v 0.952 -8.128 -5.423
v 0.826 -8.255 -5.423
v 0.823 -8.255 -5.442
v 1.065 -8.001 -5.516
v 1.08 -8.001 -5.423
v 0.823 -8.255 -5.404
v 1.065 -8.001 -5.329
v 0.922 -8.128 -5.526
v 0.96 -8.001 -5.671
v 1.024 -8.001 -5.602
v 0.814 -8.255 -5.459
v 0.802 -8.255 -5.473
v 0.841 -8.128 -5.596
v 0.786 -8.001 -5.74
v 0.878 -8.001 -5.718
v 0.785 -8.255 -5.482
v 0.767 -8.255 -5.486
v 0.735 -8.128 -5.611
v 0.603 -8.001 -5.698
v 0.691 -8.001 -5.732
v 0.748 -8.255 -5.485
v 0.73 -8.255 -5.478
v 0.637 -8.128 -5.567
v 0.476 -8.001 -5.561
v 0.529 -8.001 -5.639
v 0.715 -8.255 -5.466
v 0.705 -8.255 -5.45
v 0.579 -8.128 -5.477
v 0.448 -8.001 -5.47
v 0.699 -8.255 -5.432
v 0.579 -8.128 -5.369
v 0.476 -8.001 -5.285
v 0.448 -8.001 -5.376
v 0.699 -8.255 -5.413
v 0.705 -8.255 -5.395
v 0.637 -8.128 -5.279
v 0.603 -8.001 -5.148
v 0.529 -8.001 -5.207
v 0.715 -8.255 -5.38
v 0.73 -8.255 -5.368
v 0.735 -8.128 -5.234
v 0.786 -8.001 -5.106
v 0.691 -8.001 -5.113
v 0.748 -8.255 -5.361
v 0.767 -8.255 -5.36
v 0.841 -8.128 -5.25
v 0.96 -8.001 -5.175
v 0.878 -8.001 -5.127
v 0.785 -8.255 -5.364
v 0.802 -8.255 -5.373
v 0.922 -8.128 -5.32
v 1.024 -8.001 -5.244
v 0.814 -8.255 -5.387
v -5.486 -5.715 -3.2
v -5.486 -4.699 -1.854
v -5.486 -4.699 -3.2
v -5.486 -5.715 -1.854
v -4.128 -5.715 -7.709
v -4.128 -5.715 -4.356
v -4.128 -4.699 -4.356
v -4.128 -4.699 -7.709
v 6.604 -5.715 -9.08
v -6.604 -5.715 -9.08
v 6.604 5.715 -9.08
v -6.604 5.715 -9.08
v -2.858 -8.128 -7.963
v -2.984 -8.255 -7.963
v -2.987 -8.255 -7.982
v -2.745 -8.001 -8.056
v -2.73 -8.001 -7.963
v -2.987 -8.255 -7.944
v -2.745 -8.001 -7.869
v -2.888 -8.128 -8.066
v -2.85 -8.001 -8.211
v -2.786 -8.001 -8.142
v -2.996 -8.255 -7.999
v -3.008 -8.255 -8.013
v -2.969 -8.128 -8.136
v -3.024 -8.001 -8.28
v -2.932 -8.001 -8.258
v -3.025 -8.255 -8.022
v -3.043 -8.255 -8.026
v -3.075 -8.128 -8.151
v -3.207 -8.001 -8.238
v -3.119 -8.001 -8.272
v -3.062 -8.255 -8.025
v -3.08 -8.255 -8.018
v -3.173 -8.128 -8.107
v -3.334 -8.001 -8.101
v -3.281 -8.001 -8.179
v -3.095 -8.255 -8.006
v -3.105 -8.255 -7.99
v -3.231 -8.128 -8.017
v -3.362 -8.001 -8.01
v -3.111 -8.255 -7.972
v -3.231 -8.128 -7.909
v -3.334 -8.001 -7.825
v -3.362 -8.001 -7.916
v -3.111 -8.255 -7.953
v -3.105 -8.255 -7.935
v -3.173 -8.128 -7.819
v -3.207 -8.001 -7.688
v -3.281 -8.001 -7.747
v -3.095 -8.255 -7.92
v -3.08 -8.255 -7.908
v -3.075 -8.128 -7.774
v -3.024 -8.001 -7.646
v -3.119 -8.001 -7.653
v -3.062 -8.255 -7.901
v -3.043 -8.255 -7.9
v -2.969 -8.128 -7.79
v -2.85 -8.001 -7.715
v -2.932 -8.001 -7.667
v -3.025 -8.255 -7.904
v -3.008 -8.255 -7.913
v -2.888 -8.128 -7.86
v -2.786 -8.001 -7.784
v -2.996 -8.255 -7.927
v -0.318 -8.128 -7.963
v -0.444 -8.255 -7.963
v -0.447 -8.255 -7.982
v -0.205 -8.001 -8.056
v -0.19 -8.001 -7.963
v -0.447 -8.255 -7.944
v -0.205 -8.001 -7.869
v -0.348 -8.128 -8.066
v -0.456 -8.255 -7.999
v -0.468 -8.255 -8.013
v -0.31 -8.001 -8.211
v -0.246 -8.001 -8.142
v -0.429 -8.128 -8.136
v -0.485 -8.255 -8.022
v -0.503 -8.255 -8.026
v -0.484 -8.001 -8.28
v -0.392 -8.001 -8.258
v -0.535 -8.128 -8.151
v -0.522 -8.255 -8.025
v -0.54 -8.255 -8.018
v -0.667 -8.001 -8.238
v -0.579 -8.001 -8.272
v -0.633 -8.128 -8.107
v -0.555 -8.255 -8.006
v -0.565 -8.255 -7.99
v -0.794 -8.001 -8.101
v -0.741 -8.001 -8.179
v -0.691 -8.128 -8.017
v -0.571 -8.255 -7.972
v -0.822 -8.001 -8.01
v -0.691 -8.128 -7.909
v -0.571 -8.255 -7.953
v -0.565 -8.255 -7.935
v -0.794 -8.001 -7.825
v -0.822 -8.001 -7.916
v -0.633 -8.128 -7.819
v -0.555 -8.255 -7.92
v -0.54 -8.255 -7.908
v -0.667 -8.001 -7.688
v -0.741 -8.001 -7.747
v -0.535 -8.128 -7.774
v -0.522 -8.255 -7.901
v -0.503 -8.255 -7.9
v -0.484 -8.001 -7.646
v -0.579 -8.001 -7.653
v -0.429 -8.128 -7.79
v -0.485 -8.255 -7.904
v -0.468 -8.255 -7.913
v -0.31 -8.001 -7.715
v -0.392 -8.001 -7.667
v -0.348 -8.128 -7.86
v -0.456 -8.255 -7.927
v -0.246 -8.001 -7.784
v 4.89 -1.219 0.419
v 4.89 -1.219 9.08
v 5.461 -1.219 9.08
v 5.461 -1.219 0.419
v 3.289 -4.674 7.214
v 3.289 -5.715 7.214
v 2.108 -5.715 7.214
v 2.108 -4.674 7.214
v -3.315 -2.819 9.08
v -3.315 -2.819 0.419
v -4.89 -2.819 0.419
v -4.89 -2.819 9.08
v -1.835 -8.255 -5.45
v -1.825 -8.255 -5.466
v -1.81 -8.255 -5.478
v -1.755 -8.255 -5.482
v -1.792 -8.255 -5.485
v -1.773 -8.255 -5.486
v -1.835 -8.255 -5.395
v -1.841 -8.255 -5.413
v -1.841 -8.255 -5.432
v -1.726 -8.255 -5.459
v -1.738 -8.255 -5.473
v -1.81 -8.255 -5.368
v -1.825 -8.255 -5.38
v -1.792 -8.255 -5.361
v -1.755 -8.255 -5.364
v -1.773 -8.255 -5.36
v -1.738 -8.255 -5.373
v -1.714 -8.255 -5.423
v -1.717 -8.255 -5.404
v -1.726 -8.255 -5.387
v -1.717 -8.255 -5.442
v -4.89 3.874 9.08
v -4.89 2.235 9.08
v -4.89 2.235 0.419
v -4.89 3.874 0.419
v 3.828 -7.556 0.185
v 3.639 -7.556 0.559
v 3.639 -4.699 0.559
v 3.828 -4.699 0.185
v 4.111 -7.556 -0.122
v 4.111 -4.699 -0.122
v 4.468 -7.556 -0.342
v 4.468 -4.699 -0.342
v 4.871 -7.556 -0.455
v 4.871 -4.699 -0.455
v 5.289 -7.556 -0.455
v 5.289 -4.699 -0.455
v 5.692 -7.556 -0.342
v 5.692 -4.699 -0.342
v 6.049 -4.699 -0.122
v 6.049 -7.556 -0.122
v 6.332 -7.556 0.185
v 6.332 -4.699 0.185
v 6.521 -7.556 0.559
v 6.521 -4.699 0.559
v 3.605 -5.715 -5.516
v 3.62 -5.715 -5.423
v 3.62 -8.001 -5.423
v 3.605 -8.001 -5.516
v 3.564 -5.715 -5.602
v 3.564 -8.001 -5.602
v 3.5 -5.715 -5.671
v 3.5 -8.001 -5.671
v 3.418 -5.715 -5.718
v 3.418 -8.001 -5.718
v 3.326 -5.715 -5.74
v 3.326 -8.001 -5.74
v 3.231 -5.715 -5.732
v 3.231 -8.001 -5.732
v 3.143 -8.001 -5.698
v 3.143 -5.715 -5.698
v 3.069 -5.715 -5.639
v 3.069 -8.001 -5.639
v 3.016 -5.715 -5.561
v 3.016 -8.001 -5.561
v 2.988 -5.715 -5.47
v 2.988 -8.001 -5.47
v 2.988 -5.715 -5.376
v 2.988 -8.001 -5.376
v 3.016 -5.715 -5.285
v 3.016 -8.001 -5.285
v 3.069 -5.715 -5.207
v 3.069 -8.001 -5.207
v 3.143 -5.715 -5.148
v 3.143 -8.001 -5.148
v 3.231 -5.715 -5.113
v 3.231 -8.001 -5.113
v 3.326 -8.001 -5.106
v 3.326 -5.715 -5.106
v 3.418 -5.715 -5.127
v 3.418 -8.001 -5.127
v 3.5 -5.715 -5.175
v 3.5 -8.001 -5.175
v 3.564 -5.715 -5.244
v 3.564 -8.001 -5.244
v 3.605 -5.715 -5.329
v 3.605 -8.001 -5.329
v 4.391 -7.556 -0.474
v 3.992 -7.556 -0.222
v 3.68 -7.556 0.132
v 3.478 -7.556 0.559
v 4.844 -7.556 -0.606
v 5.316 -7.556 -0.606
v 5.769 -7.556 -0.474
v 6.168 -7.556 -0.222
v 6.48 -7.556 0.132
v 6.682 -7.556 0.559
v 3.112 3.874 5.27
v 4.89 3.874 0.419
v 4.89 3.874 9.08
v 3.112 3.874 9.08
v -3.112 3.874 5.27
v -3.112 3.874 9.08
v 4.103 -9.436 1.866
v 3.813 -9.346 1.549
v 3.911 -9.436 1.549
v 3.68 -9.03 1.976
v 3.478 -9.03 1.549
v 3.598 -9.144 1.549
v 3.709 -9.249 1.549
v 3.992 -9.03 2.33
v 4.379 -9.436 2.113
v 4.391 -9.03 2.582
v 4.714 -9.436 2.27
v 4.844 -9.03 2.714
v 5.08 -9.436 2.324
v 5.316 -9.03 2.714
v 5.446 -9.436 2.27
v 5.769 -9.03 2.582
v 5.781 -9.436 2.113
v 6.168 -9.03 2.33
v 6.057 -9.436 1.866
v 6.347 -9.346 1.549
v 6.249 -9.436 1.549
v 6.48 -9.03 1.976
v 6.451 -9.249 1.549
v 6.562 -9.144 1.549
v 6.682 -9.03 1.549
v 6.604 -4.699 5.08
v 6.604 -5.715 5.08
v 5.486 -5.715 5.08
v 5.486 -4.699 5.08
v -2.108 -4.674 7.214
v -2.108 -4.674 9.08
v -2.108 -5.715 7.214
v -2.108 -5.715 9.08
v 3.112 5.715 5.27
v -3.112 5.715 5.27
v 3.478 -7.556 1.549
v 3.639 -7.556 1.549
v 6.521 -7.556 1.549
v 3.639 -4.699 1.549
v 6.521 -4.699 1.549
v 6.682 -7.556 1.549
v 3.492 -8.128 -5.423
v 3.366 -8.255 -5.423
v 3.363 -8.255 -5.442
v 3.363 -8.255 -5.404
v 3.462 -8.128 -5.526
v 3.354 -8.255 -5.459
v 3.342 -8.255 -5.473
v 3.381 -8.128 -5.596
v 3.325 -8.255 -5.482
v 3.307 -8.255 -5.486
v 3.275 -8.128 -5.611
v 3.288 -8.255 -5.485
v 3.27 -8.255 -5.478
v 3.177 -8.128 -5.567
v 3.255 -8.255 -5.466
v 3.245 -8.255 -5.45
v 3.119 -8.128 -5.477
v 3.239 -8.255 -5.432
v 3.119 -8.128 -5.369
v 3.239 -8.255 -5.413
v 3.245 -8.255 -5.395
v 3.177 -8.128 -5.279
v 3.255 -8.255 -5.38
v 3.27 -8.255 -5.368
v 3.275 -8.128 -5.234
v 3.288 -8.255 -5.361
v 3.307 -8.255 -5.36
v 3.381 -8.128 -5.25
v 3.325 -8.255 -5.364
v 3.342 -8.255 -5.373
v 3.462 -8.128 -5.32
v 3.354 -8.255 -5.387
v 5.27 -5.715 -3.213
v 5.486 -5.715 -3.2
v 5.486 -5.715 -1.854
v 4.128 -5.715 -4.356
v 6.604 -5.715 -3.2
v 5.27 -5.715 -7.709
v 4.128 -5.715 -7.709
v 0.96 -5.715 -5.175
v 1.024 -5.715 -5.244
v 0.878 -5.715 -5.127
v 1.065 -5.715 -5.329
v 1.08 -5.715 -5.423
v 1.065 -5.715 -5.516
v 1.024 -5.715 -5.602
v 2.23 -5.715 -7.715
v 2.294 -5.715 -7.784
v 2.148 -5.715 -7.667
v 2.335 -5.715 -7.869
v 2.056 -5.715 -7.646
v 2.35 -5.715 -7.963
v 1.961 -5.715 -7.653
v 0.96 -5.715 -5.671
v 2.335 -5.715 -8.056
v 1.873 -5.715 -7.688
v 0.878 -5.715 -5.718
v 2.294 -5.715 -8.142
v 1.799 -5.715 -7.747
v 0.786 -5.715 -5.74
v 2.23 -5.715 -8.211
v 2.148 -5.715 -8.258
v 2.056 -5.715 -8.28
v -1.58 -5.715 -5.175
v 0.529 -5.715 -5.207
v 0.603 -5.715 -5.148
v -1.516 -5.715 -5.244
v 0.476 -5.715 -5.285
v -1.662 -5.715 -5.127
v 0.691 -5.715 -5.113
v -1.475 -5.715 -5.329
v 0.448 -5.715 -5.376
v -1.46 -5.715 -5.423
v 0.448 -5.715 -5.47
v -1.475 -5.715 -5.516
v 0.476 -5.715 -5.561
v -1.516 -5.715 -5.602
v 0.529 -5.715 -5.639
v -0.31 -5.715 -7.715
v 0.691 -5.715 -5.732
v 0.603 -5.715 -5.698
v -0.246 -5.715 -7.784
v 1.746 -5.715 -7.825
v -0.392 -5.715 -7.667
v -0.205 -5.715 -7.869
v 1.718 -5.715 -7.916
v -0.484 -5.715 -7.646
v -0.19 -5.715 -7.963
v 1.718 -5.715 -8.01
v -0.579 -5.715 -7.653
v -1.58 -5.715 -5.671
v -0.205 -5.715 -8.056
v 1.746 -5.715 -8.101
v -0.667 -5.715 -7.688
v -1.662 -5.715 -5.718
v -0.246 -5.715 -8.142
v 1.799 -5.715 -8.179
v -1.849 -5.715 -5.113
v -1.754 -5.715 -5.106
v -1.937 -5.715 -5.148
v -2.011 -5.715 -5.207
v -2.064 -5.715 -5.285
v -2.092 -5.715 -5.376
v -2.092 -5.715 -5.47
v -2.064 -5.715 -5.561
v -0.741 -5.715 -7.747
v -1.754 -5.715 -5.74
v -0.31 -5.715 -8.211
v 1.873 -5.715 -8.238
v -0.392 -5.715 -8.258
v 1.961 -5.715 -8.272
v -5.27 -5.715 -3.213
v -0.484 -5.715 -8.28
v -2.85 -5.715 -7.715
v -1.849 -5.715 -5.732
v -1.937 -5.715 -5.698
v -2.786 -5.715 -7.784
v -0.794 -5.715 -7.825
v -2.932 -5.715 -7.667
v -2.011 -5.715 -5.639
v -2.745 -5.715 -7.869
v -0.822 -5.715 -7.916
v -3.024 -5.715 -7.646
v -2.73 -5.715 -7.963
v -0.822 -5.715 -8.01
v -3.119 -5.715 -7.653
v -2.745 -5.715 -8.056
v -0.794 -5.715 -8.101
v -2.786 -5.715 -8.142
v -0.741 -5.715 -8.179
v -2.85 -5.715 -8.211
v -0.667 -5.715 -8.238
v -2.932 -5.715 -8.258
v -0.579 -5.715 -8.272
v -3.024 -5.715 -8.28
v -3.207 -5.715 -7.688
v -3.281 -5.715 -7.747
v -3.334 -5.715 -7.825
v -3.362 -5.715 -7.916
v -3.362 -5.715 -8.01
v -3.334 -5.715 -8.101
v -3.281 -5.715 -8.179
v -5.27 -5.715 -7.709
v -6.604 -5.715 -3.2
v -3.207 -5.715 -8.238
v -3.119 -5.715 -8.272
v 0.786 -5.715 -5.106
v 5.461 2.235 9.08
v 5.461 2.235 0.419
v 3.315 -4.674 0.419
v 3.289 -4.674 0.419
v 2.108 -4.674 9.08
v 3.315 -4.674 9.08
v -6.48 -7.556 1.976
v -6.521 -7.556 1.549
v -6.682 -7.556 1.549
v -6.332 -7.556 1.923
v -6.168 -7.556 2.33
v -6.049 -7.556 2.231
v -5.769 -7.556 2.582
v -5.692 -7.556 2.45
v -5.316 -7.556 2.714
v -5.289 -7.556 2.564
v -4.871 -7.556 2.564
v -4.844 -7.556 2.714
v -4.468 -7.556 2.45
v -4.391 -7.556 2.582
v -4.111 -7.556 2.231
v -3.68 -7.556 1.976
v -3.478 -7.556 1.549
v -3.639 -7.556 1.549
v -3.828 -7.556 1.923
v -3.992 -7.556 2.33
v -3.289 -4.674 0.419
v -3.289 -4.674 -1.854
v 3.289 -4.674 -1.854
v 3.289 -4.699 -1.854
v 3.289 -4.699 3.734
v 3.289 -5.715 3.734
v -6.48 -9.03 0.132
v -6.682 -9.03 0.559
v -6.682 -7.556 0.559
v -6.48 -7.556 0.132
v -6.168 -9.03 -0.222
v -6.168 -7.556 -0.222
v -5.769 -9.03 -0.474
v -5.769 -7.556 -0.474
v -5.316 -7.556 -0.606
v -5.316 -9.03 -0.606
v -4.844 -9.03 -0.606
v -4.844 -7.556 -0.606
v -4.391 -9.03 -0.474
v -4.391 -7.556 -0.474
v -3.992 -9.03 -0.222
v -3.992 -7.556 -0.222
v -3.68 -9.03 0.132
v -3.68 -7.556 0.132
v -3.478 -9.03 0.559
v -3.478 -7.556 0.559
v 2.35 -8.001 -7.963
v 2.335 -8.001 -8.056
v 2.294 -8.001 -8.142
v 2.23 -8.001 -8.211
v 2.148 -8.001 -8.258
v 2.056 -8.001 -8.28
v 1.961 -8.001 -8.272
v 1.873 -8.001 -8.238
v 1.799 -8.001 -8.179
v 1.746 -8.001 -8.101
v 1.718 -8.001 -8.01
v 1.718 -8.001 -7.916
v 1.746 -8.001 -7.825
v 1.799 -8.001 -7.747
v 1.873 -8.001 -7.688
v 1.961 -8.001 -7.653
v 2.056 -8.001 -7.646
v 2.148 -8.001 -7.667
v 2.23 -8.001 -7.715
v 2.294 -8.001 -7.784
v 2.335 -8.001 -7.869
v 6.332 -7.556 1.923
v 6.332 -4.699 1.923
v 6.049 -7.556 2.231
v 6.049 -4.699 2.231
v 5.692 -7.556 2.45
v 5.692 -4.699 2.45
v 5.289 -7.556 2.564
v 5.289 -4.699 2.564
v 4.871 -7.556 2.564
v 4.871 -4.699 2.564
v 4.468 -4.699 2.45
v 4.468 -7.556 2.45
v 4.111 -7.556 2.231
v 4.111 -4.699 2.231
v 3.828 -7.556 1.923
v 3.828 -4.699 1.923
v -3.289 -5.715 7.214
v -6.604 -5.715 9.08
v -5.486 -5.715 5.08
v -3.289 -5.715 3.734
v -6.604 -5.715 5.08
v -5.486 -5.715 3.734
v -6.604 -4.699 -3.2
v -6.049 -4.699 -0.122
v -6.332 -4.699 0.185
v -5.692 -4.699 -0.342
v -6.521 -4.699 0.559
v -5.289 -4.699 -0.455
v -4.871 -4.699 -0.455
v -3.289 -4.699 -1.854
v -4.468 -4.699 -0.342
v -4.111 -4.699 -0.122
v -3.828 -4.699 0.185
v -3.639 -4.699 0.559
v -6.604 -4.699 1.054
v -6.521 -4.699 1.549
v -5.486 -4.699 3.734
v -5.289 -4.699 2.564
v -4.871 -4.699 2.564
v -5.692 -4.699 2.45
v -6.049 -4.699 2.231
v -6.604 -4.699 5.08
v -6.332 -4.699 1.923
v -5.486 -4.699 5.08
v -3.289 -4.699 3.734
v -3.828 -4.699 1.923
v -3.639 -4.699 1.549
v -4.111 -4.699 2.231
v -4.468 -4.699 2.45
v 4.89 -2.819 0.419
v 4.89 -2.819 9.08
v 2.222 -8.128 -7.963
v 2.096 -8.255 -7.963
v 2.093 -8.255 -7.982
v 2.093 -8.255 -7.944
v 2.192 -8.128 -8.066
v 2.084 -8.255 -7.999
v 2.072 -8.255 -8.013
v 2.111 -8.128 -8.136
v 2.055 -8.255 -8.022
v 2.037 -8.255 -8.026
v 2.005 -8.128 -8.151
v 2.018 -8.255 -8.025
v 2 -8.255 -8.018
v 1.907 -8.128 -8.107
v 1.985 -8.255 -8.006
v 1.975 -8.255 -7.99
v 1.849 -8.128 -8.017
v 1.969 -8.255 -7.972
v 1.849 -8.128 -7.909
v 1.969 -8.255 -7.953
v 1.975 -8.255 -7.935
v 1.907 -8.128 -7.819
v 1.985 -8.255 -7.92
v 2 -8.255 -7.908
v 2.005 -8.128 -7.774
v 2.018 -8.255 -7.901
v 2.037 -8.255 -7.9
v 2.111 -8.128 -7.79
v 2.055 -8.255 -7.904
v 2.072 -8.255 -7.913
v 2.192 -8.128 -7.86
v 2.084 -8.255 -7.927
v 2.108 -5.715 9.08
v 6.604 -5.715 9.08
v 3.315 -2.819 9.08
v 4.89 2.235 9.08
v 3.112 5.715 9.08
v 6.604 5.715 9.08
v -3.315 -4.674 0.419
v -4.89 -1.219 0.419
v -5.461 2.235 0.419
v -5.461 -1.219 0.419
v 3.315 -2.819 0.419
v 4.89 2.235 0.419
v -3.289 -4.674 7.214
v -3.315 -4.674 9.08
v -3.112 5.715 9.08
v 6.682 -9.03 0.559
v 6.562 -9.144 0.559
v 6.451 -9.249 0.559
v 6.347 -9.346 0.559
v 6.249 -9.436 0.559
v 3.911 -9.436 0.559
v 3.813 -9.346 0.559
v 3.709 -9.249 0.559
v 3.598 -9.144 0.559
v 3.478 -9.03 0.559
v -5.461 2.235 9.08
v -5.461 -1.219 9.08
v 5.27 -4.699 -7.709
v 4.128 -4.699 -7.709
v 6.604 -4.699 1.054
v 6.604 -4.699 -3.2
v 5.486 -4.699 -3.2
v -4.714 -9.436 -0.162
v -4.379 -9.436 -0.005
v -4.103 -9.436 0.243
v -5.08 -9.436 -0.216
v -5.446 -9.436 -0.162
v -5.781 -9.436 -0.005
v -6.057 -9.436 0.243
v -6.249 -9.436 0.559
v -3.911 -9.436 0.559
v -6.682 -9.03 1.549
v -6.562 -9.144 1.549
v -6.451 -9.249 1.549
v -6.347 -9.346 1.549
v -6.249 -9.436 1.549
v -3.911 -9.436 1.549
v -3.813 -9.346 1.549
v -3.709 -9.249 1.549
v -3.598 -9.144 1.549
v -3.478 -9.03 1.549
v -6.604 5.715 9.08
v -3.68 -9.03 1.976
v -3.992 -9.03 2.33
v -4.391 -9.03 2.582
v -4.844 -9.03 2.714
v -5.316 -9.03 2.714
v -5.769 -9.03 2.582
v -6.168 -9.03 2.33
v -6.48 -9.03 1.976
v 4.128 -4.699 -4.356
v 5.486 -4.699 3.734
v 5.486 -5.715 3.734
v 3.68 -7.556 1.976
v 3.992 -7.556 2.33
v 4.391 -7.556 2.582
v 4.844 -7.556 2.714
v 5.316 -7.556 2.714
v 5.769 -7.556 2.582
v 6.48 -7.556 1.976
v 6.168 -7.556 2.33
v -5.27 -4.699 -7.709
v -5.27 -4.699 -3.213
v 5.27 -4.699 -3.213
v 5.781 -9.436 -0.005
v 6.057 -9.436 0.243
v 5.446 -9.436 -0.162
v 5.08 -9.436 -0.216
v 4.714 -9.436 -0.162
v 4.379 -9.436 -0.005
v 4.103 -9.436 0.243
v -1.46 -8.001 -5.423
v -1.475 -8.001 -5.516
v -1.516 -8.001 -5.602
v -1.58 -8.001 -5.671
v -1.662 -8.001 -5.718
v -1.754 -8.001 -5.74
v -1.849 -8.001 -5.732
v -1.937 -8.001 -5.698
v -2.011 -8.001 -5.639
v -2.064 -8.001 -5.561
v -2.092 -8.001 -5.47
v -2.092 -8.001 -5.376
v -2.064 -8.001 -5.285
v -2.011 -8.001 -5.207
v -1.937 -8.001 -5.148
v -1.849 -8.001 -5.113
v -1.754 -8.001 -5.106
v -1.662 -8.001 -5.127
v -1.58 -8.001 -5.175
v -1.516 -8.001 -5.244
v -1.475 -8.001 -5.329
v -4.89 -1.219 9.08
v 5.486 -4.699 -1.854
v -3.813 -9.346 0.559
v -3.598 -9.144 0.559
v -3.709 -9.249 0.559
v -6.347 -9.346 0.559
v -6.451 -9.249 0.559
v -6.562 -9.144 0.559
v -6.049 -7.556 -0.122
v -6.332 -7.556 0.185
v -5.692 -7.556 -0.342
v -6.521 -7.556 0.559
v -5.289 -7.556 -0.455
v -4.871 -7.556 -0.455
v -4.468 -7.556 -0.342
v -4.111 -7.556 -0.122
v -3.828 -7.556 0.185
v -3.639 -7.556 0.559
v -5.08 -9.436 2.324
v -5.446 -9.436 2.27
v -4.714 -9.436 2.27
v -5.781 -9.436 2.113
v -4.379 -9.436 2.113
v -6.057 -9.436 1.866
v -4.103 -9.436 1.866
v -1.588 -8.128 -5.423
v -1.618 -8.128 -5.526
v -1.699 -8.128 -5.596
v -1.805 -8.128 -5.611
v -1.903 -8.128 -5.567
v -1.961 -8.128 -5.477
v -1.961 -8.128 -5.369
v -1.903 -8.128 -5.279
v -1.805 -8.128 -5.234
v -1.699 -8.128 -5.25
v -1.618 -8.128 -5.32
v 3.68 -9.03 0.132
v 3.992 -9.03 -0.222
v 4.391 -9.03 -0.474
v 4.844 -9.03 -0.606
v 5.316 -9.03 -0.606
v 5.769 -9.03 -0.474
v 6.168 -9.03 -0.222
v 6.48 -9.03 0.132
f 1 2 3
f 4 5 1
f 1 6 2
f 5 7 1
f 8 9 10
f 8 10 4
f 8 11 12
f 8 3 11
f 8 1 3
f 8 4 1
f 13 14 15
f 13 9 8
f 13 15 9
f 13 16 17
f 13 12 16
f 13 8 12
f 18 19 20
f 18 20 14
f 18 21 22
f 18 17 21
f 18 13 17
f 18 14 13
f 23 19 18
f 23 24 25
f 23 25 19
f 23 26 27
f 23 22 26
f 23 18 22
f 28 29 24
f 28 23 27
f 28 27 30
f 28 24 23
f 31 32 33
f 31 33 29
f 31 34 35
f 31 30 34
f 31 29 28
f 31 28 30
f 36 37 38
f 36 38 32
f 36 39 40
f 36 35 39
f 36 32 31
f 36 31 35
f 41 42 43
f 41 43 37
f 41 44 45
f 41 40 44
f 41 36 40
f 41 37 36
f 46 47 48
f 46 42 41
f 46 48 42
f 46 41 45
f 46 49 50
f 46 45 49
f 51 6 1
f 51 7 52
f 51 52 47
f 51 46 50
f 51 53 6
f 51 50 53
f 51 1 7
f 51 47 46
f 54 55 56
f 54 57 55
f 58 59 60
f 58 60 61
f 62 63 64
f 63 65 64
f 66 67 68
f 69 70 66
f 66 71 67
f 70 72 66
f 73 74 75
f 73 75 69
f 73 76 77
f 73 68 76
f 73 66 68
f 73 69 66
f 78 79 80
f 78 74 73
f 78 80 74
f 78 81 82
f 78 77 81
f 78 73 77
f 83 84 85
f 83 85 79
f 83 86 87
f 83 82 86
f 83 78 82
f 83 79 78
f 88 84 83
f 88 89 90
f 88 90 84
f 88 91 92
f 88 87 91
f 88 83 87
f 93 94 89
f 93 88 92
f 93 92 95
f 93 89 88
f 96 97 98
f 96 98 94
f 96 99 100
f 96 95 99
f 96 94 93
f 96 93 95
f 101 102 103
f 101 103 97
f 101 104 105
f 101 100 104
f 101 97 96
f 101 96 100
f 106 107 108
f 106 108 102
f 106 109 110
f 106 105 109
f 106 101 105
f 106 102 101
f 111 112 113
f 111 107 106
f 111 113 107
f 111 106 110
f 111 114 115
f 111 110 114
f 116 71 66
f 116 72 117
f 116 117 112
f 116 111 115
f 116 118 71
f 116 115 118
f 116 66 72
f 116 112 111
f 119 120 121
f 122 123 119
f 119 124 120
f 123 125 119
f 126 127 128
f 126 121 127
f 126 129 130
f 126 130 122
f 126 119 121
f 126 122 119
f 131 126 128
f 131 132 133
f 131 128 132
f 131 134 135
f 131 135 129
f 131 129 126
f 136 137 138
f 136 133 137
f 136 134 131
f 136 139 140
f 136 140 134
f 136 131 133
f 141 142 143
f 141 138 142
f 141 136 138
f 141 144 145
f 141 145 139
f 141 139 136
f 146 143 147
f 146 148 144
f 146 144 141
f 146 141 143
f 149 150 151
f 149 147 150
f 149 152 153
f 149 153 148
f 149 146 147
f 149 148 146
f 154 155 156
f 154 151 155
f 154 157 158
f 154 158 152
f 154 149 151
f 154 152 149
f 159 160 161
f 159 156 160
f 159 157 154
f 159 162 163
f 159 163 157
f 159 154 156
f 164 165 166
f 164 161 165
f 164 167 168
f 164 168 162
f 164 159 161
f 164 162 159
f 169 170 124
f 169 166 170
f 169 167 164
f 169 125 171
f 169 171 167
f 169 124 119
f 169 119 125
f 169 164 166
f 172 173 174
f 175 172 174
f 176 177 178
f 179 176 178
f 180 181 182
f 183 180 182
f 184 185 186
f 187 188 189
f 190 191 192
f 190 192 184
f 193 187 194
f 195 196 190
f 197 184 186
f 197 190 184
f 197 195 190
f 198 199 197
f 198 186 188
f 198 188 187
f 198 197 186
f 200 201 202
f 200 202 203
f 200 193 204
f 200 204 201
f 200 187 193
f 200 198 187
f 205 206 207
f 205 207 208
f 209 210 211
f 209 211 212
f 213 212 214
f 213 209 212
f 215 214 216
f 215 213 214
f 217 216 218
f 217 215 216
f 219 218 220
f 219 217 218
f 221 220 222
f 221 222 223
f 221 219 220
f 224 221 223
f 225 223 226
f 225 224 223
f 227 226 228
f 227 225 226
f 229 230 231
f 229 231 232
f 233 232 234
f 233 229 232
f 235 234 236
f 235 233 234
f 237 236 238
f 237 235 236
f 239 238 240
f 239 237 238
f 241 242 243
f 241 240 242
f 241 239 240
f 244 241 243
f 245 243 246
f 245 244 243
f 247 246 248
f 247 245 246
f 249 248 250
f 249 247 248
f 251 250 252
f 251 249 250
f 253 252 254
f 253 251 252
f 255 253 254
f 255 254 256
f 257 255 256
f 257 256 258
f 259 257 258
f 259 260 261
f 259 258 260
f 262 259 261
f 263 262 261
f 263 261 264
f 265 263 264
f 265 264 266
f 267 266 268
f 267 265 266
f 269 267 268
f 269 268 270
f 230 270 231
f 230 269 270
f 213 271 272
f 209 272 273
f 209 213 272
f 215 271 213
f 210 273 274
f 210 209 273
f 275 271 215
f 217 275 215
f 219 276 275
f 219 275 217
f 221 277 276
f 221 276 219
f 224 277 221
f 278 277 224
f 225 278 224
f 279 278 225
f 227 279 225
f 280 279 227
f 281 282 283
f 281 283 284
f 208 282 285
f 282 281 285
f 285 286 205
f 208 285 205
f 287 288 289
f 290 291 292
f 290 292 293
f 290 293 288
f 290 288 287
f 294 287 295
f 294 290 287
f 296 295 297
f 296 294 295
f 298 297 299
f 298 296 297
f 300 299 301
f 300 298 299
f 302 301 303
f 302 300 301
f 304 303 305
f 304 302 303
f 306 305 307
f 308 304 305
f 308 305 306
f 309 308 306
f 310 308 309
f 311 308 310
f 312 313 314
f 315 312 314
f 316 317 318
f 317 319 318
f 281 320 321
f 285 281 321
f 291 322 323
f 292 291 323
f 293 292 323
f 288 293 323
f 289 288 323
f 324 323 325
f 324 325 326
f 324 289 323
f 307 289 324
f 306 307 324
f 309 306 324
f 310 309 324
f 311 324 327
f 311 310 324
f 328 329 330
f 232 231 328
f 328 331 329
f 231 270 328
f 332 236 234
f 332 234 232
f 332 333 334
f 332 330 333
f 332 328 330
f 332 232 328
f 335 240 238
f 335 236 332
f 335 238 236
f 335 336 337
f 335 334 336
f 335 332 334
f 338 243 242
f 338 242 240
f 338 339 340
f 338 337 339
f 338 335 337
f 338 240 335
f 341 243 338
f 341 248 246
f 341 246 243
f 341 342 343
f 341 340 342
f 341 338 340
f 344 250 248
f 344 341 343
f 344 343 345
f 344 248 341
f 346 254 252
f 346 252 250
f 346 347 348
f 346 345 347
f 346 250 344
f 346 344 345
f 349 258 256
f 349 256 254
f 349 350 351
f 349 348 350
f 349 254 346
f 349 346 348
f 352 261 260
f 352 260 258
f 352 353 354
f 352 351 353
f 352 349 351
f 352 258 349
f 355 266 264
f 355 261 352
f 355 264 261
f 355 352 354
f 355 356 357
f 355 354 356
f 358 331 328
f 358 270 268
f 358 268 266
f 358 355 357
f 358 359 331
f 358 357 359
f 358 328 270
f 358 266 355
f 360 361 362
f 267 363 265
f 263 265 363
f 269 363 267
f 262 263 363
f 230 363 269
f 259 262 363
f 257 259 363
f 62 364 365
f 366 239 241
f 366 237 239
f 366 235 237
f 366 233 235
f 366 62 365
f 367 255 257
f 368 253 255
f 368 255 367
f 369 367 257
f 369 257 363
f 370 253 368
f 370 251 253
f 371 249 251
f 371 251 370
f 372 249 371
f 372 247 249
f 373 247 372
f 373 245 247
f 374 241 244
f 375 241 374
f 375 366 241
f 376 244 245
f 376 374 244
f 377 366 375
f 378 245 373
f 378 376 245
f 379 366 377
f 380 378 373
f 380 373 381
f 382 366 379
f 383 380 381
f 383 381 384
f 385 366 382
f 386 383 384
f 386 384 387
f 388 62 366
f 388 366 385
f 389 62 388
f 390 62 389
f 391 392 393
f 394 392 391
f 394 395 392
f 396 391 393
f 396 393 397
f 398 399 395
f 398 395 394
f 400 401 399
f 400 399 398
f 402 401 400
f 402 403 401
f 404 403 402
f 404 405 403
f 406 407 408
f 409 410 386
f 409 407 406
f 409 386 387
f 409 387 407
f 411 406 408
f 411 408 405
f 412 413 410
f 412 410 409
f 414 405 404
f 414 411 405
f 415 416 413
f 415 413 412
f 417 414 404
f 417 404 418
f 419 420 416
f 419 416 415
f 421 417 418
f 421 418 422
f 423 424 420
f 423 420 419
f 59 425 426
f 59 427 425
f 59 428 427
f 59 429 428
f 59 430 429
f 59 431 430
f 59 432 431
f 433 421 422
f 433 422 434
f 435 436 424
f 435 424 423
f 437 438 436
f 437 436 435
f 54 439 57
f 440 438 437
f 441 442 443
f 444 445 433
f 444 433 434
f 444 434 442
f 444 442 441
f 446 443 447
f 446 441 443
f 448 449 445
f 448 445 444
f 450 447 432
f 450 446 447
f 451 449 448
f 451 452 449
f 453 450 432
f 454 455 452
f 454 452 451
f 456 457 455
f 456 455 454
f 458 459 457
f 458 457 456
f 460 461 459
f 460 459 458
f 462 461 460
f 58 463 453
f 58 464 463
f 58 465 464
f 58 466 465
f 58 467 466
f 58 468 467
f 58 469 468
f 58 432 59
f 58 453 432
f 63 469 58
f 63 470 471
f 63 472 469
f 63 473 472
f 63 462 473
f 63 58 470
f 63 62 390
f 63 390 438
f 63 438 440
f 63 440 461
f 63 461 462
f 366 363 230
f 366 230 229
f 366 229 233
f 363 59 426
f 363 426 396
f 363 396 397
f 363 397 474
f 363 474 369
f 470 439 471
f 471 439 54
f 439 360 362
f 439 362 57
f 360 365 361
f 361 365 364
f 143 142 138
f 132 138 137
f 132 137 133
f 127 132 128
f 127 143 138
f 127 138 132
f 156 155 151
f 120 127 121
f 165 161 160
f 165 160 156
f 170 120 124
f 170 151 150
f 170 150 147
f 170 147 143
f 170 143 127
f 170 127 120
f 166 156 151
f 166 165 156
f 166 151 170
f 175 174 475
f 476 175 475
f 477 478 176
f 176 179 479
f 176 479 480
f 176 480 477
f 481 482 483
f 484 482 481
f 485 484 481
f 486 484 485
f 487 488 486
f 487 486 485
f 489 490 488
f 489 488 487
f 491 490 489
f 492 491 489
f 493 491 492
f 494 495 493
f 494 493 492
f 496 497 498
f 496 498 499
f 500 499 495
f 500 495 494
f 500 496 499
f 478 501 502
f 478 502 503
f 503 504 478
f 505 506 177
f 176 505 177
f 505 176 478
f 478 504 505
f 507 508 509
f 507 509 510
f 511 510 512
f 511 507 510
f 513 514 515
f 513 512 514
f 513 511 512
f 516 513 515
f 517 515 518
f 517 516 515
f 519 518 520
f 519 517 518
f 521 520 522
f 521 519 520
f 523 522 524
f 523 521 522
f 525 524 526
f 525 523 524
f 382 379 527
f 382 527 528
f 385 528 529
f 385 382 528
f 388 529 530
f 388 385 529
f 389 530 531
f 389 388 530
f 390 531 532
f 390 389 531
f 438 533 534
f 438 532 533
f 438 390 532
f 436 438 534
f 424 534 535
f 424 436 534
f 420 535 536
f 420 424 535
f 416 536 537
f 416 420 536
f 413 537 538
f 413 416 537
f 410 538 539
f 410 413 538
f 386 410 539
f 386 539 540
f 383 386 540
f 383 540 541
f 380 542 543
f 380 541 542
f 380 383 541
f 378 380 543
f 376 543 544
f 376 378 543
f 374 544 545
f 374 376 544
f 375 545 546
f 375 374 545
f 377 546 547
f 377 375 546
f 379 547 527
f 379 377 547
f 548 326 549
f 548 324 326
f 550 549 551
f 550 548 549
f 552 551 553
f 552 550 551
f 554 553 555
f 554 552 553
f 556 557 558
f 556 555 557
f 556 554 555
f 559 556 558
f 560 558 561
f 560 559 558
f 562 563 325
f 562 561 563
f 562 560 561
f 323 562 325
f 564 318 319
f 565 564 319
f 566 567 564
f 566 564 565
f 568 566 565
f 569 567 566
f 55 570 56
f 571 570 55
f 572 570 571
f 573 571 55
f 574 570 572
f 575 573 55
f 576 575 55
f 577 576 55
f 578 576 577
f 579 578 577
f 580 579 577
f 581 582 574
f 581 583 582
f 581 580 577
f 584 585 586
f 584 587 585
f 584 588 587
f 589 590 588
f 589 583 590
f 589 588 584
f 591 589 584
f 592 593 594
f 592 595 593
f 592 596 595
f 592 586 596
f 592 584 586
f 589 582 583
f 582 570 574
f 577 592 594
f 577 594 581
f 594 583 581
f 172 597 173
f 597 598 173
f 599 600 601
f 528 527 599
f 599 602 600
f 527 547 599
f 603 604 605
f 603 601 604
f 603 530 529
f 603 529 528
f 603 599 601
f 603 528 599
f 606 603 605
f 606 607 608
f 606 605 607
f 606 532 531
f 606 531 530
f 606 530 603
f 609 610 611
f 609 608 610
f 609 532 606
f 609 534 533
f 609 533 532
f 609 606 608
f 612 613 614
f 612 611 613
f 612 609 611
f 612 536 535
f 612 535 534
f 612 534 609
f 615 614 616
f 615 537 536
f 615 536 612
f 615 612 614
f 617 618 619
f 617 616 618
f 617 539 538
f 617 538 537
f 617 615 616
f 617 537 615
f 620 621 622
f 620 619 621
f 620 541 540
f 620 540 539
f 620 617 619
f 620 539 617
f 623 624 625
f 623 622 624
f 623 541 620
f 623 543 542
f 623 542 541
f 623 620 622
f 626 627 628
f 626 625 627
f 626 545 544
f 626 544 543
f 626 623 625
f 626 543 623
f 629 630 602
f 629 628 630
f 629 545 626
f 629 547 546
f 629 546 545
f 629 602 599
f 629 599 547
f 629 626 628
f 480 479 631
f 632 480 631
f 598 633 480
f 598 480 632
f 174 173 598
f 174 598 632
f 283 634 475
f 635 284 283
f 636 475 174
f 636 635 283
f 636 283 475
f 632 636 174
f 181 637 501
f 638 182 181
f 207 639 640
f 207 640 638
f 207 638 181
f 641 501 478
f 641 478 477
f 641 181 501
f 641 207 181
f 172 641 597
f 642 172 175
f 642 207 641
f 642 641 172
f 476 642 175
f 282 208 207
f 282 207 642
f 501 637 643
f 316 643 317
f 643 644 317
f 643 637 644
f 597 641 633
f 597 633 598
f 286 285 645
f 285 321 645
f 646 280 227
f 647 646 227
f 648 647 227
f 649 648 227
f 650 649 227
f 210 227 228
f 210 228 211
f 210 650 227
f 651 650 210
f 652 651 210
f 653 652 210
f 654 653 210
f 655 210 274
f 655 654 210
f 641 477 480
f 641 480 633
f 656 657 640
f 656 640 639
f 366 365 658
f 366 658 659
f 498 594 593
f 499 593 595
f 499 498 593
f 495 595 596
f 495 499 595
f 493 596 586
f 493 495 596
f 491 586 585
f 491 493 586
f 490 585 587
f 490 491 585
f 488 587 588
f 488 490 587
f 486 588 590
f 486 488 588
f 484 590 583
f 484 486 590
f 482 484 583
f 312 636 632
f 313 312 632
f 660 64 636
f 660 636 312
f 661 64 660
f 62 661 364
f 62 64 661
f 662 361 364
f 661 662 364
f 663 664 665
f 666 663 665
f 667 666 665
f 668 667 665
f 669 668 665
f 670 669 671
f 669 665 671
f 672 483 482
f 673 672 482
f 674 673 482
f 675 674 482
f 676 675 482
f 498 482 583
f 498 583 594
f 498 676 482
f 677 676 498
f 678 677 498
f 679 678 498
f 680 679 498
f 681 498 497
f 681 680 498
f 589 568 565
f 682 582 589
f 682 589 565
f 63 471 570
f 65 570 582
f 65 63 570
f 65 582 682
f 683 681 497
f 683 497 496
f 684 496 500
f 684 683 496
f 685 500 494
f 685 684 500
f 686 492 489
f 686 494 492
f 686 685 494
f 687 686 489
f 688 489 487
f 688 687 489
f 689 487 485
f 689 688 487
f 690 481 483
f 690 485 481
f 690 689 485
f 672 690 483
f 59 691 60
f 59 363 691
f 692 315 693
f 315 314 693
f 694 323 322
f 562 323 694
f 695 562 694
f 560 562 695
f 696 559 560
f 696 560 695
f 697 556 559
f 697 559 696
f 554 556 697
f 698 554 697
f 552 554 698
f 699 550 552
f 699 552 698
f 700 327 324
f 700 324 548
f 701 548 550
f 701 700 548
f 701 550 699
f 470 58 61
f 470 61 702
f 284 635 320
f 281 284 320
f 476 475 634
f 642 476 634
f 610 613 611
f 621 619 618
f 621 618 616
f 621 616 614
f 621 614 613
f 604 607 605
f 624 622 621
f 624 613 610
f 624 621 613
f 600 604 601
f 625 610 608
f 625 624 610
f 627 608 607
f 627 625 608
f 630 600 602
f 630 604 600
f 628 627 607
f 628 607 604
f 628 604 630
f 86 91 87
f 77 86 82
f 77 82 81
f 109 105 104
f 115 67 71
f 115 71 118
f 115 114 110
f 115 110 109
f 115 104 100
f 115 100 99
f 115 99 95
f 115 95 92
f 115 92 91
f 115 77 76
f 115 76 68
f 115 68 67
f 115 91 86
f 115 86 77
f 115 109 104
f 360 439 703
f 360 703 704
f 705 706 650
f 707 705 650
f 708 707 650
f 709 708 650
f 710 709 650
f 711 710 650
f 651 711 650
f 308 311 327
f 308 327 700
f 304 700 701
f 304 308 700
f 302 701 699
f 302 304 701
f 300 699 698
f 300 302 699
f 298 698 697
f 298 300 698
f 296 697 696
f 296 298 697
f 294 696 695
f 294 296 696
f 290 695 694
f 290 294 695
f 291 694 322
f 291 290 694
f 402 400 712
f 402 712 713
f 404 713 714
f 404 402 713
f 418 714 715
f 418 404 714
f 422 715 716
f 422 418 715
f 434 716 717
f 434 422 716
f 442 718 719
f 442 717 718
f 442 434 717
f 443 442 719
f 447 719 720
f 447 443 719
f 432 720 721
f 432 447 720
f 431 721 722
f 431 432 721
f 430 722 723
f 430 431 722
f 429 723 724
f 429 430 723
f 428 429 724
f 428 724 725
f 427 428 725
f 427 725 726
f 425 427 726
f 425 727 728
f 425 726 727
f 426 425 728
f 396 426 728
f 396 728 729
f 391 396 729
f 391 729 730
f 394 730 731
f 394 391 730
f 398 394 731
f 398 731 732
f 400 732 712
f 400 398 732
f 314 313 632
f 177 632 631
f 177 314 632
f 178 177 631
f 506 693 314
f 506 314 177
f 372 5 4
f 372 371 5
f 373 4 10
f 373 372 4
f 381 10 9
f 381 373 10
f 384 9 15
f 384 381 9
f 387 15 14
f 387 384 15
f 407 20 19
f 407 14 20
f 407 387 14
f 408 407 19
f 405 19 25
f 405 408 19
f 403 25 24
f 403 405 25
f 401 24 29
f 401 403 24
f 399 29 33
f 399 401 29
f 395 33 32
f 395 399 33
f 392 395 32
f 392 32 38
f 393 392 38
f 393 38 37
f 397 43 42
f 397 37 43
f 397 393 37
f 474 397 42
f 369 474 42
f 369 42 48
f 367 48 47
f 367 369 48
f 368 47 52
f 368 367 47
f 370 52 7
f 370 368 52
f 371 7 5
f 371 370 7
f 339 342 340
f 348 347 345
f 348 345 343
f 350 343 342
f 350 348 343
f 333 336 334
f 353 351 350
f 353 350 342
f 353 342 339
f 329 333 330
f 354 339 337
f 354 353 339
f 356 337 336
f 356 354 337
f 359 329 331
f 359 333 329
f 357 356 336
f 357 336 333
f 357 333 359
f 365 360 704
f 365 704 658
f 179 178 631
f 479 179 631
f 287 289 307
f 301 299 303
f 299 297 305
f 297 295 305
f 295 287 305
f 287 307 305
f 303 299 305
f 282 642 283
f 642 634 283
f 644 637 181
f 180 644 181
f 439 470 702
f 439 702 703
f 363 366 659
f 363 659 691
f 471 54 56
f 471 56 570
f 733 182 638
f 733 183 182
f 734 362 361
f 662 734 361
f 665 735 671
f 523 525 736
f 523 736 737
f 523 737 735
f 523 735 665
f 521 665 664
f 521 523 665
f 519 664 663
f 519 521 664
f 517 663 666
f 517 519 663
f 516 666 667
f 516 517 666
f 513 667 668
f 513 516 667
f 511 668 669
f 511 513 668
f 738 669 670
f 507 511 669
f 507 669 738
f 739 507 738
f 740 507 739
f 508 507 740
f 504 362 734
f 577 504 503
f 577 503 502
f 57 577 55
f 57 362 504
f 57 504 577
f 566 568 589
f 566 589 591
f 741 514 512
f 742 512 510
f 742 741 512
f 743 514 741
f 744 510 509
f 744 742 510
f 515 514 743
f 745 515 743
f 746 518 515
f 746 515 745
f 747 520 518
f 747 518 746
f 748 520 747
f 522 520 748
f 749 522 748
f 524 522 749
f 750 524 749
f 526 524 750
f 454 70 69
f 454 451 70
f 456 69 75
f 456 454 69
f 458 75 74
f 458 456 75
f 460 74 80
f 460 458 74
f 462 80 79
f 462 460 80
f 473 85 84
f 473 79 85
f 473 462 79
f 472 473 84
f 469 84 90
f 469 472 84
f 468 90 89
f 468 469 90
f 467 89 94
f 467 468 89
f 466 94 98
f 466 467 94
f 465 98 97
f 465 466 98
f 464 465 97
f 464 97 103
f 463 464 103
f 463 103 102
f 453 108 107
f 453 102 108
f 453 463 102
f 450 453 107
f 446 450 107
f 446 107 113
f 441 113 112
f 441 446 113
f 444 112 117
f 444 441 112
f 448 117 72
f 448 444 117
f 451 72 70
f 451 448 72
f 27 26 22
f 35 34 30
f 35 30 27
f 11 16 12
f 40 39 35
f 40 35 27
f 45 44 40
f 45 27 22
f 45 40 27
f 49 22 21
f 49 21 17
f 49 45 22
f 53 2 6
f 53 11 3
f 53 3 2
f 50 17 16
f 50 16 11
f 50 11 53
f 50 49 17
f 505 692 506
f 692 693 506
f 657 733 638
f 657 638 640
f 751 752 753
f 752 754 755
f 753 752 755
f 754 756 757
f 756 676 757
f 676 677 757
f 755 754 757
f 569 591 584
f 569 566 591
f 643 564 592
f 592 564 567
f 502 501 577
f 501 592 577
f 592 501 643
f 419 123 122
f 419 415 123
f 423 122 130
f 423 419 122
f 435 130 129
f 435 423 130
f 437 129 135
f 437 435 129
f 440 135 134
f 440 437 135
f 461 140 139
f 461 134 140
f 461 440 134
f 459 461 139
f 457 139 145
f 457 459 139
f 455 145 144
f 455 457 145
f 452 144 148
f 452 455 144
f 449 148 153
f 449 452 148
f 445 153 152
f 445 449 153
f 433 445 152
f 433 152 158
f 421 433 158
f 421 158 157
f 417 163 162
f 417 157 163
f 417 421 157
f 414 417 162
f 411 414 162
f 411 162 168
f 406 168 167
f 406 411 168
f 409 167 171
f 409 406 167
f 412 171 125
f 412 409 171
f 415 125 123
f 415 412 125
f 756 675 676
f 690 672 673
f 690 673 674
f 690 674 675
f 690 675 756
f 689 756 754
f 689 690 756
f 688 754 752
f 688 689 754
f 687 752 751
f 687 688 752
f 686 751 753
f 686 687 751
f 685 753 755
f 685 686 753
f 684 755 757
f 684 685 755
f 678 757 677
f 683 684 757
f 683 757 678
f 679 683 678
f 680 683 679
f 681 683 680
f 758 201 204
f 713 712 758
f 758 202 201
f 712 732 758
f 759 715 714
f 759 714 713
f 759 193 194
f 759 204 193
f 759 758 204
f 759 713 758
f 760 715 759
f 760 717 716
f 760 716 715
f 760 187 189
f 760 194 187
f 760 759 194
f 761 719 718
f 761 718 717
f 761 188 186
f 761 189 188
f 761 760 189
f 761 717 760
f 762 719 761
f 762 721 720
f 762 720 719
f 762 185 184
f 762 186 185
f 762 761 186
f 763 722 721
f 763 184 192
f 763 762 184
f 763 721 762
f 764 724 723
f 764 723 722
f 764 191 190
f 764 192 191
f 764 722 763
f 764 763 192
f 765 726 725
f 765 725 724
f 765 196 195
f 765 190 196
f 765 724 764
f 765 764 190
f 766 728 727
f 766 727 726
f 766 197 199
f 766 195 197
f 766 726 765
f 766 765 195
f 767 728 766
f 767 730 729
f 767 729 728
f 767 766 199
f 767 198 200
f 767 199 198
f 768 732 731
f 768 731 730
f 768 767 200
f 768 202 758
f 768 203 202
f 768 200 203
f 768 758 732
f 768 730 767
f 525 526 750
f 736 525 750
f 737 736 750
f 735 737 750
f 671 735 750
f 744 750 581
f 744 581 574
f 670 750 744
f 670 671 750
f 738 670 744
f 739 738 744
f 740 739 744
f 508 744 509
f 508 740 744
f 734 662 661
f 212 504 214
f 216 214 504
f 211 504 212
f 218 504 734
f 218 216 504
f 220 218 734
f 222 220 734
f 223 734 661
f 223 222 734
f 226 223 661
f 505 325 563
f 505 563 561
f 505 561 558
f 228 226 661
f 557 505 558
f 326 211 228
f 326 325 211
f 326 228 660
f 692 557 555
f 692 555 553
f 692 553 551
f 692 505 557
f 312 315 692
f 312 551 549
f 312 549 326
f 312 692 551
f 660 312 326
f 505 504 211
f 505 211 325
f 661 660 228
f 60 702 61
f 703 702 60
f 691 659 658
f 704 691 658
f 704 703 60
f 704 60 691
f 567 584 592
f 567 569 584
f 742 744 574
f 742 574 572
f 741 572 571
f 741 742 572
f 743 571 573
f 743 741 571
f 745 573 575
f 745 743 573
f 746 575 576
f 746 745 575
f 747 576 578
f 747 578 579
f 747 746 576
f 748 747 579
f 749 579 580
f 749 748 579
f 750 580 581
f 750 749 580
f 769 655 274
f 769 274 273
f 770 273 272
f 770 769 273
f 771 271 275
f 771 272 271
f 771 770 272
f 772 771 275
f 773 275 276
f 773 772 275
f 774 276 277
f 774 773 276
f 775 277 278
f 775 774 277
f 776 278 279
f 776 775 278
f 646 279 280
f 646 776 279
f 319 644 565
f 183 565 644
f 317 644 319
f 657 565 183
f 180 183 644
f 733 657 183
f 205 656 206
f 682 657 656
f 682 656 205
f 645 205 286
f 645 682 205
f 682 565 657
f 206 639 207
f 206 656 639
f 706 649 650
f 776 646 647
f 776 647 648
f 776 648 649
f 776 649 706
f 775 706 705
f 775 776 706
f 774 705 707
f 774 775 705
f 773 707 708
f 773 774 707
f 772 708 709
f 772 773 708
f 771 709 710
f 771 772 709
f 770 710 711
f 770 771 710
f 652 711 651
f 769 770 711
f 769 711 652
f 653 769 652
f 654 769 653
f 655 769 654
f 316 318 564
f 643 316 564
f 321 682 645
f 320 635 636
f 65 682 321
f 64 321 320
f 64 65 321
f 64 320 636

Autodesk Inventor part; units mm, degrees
ref_plane "XZ Plane" through (0, 0, 0) normal (0, 1, 0) x (-1, 0, 0)
sketch "Sketch1" plane through (0, 0, 0) normal (0, 0, 1) x (1, 0, 0)
  line L0 (6.604, -5.715) -> (-6.604, -5.715)
  line L1 (-6.604, -5.715) -> (-6.604, 5.715)
  line L2 (-6.604, 5.715) -> (6.604, 5.715)
  line L3 (6.604, 5.715) -> (6.604, -5.715)
  line L4 (6.604, -5.715) -> (-6.604, 5.715) construction
  line L5 (-6.604, -5.715) -> (6.604, 5.715) construction
  point P0 (0, 0)
  dimension "d0" = 13.208
  dimension "d1" = 11.43
extrude "Extrusion1" add sketch "Sketch1" along normal mid plane 18.161
sketch "Sketch2" plane through (0, 0, 9.0805) normal (0, 0, 1) x (1, 0, 0)
  line L0 (0, -4.6736) -> (-3.3147, -4.6736)
  line L1 (-3.3147, -4.6736) -> (-3.3147, -2.8194)
  line L2 (-3.3147, -2.8194) -> (-4.8895, -2.8194)
  line L3 (-4.8895, -2.8194) -> (-4.8895, -1.2192)
  line L4 (-4.8895, -1.2192) -> (-5.461, -1.2192)
  line L5 (-5.461, -1.2192) -> (-5.461, 2.2352)
  line L6 (-5.461, 2.2352) -> (-4.8895, 2.2352)
  line L7 (-4.8895, 2.2352) -> (-4.8895, 3.8735)
  line L8 (-4.8895, 3.8735) -> (0, 3.8735)
  line L9 (0, 3.8735) -> (0, -4.6736) construction
  line L10 (6.604, 5.715) -> (-6.604, 5.715) construction
  line L11 (-6.604, -5.715) -> (6.604, -5.715) construction
  line L12 (0, -4.6736) -> (3.3147, -4.6736)
  line L13 (3.3147, -4.6736) -> (3.3147, -2.8194)
  line L14 (3.3147, -2.8194) -> (4.8895, -2.8194)
  line L15 (4.8895, -2.8194) -> (4.8895, -1.2192)
  line L16 (4.8895, -1.2192) -> (5.461, -1.2192)
  line L17 (5.461, -1.2192) -> (5.461, 2.2352)
  line L18 (5.461, 2.2352) -> (4.8895, 2.2352)
  line L19 (4.8895, 2.2352) -> (4.8895, 3.8735)
  line L20 (4.8895, 3.8735) -> (0, 3.8735)
  point P0 (0, 0)
  dimension "d17" = 1.8415
  dimension "d18" = 4.8895
  dimension "d19" = 5.461
  dimension "d20" = 1.0414
  dimension "d21" = 1.8542
  dimension "d22" = 4.4958
  dimension "d23" = 3.4798
  dimension "d24" = 3.3147
extrude "Extrusion2" cut sketch "Sketch2" against normal blind 8.6614
sketch "Sketch3" plane through (-6.604, 5.715, 9.0805) normal (0, 1, 0) x (1, 0, 0)
  line L0 (3.4925, 0) -> (9.7155, 0)
  line L1 (9.7155, 0) -> (9.7155, 3.81)
  line L2 (9.7155, 3.81) -> (3.4925, 3.81)
  line L3 (3.4925, 3.81) -> (3.4925, 0)
  line L4 (13.208, 0) -> (0, 0) projected
  point P0 (6.604, 9.0805)
  point P1 (6.604, 3.81)
  dimension "d27" = 6.223
  dimension "d28" = 3.81
extrude "Extrusion3" cut sketch "Sketch3" against normal up to surface (1.8415 mm away)
sketch "Sketch4" plane through (-6.604, -5.715, 9.0805) normal (0, -1, 0) x (1, 0, 0)
  line L0 (9.9187, 0) -> (3.2893, 0) projected
  line L1 (4.4958, 0) -> (4.4958, -1.8669)
  line L2 (4.4958, -1.8669) -> (3.3147, -1.8669)
  line L3 (3.3147, -1.8669) -> (3.3147, -10.9347)
  line L4 (3.3147, -10.9347) -> (9.8933, -10.9347)
  line L5 (9.8933, -10.9347) -> (9.8933, -1.8669)
  line L6 (9.8933, -1.8669) -> (8.7122, -1.8669)
  line L7 (8.7122, -1.8669) -> (8.7122, 0)
  line L8 (8.7122, 0) -> (4.4958, 0)
  point P0 (6.604, -9.0805)
  point P1 (6.604, 0)
  point P2 (6.604, -10.9347)
  dimension "d31" = 1.8669
  dimension "d32" = 4.2164
  dimension "d33" = 9.0678
  dimension "d34" = 6.5786
extrude "Extrusion4" cut sketch "Sketch4" against normal up to surface (1.0414 mm away)
sketch "Sketch5" plane through (-6.604, -5.715, -9.0805) normal (0, -1, 0) x (1, 0, 0)
  line L0 (0, 18.161) -> (0, 0) projected
  line L1 (0, 14.1605) -> (1.1176, 14.1605)
  line L2 (1.1176, 14.1605) -> (1.1176, 12.8143)
  line L3 (1.1176, 12.8143) -> (3.3147, 12.8143)
  line L4 (3.3147, 12.8143) -> (3.3147, 7.2263)
  line L5 (3.3147, 7.2263) -> (1.1176, 7.2263)
  line L6 (1.1176, 7.2263) -> (1.1176, 5.8801)
  line L7 (1.1176, 5.8801) -> (0, 5.8801)
  line L8 (0, 5.8801) -> (0, 14.1605)
  line L9 (3.3147, 7.2263) -> (3.3147, 16.2941) construction
  line L10 (6.604, 9.0805) -> (6.604, 17.5857) construction
  line L11 (1.3335, 1.3716) -> (1.3335, 5.8674)
  line L12 (1.3335, 5.8674) -> (11.8745, 5.8674)
  line L13 (11.8745, 5.8674) -> (11.8745, 1.3716)
  line L14 (11.8745, 1.3716) -> (10.7315, 1.3716)
  line L15 (10.7315, 1.3716) -> (10.7315, 4.7244)
  line L16 (10.7315, 4.7244) -> (2.4765, 4.7244)
  line L17 (2.4765, 4.7244) -> (2.4765, 1.3716)
  line L18 (2.4765, 1.3716) -> (1.3335, 1.3716)
  line L19 (13.208, 0) -> (0, 0) projected
  line L20 (13.208, 14.1605) -> (12.0904, 14.1605)
  line L21 (12.0904, 14.1605) -> (12.0904, 12.8143)
  line L22 (12.0904, 12.8143) -> (9.8933, 12.8143)
  line L23 (9.8933, 12.8143) -> (9.8933, 7.2263)
  line L24 (9.8933, 7.2263) -> (12.0904, 7.2263)
  line L25 (12.0904, 7.2263) -> (12.0904, 5.8801)
  line L26 (12.0904, 5.8801) -> (13.208, 5.8801)
  line L27 (13.208, 5.8801) -> (13.208, 14.1605)
  point P0 (6.604, 5.8674)
  dimension "d38" = 5.588
  dimension "d39" = 1.1176
  dimension "d41" = 8.2804
  dimension "d42" = 1.143
  dimension "d43" = 4.4958
  dimension "d44" = 1.143
  dimension "d45" = 1.3716
  dimension "d46" = 10.541
extrude "Extrusion5" cut sketch "Sketch5" against normal blind 1.016
ref_plane "Work Plane1" through (5.08, 0, 0) normal (1, 0, 0) x (0, 1, 0)
ref_plane "Work Plane2" through (-5.08, 0, 0) normal (1, 0, 0) x (0, 1, 0)
sketch "Sketch6" plane through (5.08, 0, 0) normal (1, 0, 0) x (0, 1, 0)
  line L0 (-4.6736, 2.5781) -> (-7.5565, 2.5781)
  line L1 (-7.5565, 2.5781) -> (-7.5565, 2.7305)
  line L2 (-7.5565, 2.7305) -> (-9.0297, 2.7305)
  line L3 (-9.0297, 2.7305) -> (-9.4361, 2.3241)
  line L4 (-9.4361, 2.3241) -> (-9.4361, 1.0541)
  line L5 (-9.4361, 1.0541) -> (-4.6736, 1.0541)
  line L6 (-4.6736, 2.5781) -> (-4.6736, 1.0541)
  line L7 (-4.6736, 9.0805) -> (-4.6736, 0.4191) construction
  line L8 (-4.6736, 9.0805) -> (-5.715, 9.0805) construction
  point P0 (0, 0)
  point P1 (0, 0)
  dimension "d51" = 1.524
  dimension "d53" = 1.6764
  dimension "d54" = 45
  dimension "d55" = 1.27
  dimension "d58" = 4.7625
  dimension "d59" = 1.4732
  dimension "d60" = 6.5024
revolve "Revolution1" add sketch "Sketch6" angle 360 about axis through (5.08, -9.4361, 1.0541) along (0, 1, 0)
sketch "Sketch7" plane through (-5.08, 0, 0) normal (1, 0, 0) x (0, 1, 0)
  line L0 (-4.6736, 2.5781) -> (-7.5565, 2.5781)
  line L1 (-7.5565, 2.5781) -> (-7.5565, 2.7305)
  line L2 (-7.5565, 2.7305) -> (-9.0297, 2.7305)
  line L3 (-9.0297, 2.7305) -> (-9.4361, 2.3241)
  line L4 (-9.4361, 2.3241) -> (-9.4361, 1.0541)
  line L5 (-9.4361, 1.0541) -> (-4.6736, 1.0541)
  line L6 (-4.6736, 2.5781) -> (-4.6736, 1.0541)
  line L7 (-4.6736, 9.0805) -> (-4.6736, 0.4191) construction
  line L8 (-4.6736, 9.0805) -> (-5.715, 9.0805) construction
  point P0 (0, 0)
  point P1 (0, 0)
  point P2 (0, 0)
  dimension "d62" = 1.524
  dimension "d63" = 1.6764
  dimension "d64" = 45
  dimension "d65" = 1.27
  dimension "d66" = 4.7625
  dimension "d67" = 1.4732
  dimension "d68" = 6.5024
revolve "Revolution2" add sketch "Sketch7" angle 360 about axis through (-5.08, -9.4361, 1.0541) along (0, 1, 0)
sketch "Sketch8" plane through (-5.08, -9.4361, 1.0541) normal (0, -1, 0) x (1, 0, 0)
  line L0 (-1.6764, 0.4953) -> (11.8364, 0.4953)
  line L1 (11.8364, 0.4953) -> (11.8364, -0.4953)
  line L2 (11.8364, -0.4953) -> (-1.6764, -0.4953)
  line L3 (-1.6764, -0.4953) -> (-1.6764, 0.4953)
  circle A0 centre (0, 0) radius 1.6764 construction
  circle A1 centre (10.16, 0) radius 1.6764 construction
  point P0 (5.08, -1.0541)
  point P1 (-1.6764, 0)
  point P2 (11.8364, 0)
  dimension "d70" = 0.9906
extrude "Extrusion6" cut sketch "Sketch8" against normal up to surface (4.7371 mm away)
sketch "Sketch9" plane through (-6.604, -5.715, -9.0805) normal (0, -1, 0) x (1, 0, 0)
  line L0 (9.7155, 14.351) -> (3.4925, 14.351)
  line L1 (9.7155, 18.161) -> (9.7155, 14.351)
  line L2 (3.4925, 14.351) -> (3.4925, 18.161)
  circle A0 centre (9.906, 3.6576) radius 0.3175
  circle A1 centre (8.636, 1.1176) radius 0.3175
  line L3 (9.7155, 14.351) -> (3.4925, 14.351) projected
  line L4 (13.208, 0) -> (13.208, 5.8801) projected
  line L5 (13.208, 0) -> (0, 0) projected
  circle A2 centre (7.366, 3.6576) radius 0.3175
  circle A3 centre (6.096, 1.1176) radius 0.3175
  circle A4 centre (4.826, 3.6576) radius 0.3175
  circle A5 centre (3.556, 1.1176) radius 0.3175
  point P0 (6.604, 9.0805)
  dimension "d73" = 3.302
  dimension "d74" = 2.54
  dimension "d75" = 1.27
  dimension "d76" = 3.6576
  dimension "d77" = 0.635
  dimension "d80" = 2.54
extrude "Extrusion7" add sketch "Sketch9" along normal blind 2.54 and the other way blind 1.27
chamfer "Chamfer1" distance 0.254 angle 45 6 edges at (1.7145, -8.255, -7.9629) (2.9845, -8.255, -5.4229) (0.4445, -8.255, -5.4229) (-0.8255, -8.255, -7.9629) (-2.0955, -8.255, -5.4229) (-3.3655, -8.255, -7.9629)
equation "\"d44\" = d42"
equation "\"d50\" = -d49"
equation "\"d49\" = 5.08"
properties part number "RJ12 - 90deg" material "Thermoplastic Resin"
